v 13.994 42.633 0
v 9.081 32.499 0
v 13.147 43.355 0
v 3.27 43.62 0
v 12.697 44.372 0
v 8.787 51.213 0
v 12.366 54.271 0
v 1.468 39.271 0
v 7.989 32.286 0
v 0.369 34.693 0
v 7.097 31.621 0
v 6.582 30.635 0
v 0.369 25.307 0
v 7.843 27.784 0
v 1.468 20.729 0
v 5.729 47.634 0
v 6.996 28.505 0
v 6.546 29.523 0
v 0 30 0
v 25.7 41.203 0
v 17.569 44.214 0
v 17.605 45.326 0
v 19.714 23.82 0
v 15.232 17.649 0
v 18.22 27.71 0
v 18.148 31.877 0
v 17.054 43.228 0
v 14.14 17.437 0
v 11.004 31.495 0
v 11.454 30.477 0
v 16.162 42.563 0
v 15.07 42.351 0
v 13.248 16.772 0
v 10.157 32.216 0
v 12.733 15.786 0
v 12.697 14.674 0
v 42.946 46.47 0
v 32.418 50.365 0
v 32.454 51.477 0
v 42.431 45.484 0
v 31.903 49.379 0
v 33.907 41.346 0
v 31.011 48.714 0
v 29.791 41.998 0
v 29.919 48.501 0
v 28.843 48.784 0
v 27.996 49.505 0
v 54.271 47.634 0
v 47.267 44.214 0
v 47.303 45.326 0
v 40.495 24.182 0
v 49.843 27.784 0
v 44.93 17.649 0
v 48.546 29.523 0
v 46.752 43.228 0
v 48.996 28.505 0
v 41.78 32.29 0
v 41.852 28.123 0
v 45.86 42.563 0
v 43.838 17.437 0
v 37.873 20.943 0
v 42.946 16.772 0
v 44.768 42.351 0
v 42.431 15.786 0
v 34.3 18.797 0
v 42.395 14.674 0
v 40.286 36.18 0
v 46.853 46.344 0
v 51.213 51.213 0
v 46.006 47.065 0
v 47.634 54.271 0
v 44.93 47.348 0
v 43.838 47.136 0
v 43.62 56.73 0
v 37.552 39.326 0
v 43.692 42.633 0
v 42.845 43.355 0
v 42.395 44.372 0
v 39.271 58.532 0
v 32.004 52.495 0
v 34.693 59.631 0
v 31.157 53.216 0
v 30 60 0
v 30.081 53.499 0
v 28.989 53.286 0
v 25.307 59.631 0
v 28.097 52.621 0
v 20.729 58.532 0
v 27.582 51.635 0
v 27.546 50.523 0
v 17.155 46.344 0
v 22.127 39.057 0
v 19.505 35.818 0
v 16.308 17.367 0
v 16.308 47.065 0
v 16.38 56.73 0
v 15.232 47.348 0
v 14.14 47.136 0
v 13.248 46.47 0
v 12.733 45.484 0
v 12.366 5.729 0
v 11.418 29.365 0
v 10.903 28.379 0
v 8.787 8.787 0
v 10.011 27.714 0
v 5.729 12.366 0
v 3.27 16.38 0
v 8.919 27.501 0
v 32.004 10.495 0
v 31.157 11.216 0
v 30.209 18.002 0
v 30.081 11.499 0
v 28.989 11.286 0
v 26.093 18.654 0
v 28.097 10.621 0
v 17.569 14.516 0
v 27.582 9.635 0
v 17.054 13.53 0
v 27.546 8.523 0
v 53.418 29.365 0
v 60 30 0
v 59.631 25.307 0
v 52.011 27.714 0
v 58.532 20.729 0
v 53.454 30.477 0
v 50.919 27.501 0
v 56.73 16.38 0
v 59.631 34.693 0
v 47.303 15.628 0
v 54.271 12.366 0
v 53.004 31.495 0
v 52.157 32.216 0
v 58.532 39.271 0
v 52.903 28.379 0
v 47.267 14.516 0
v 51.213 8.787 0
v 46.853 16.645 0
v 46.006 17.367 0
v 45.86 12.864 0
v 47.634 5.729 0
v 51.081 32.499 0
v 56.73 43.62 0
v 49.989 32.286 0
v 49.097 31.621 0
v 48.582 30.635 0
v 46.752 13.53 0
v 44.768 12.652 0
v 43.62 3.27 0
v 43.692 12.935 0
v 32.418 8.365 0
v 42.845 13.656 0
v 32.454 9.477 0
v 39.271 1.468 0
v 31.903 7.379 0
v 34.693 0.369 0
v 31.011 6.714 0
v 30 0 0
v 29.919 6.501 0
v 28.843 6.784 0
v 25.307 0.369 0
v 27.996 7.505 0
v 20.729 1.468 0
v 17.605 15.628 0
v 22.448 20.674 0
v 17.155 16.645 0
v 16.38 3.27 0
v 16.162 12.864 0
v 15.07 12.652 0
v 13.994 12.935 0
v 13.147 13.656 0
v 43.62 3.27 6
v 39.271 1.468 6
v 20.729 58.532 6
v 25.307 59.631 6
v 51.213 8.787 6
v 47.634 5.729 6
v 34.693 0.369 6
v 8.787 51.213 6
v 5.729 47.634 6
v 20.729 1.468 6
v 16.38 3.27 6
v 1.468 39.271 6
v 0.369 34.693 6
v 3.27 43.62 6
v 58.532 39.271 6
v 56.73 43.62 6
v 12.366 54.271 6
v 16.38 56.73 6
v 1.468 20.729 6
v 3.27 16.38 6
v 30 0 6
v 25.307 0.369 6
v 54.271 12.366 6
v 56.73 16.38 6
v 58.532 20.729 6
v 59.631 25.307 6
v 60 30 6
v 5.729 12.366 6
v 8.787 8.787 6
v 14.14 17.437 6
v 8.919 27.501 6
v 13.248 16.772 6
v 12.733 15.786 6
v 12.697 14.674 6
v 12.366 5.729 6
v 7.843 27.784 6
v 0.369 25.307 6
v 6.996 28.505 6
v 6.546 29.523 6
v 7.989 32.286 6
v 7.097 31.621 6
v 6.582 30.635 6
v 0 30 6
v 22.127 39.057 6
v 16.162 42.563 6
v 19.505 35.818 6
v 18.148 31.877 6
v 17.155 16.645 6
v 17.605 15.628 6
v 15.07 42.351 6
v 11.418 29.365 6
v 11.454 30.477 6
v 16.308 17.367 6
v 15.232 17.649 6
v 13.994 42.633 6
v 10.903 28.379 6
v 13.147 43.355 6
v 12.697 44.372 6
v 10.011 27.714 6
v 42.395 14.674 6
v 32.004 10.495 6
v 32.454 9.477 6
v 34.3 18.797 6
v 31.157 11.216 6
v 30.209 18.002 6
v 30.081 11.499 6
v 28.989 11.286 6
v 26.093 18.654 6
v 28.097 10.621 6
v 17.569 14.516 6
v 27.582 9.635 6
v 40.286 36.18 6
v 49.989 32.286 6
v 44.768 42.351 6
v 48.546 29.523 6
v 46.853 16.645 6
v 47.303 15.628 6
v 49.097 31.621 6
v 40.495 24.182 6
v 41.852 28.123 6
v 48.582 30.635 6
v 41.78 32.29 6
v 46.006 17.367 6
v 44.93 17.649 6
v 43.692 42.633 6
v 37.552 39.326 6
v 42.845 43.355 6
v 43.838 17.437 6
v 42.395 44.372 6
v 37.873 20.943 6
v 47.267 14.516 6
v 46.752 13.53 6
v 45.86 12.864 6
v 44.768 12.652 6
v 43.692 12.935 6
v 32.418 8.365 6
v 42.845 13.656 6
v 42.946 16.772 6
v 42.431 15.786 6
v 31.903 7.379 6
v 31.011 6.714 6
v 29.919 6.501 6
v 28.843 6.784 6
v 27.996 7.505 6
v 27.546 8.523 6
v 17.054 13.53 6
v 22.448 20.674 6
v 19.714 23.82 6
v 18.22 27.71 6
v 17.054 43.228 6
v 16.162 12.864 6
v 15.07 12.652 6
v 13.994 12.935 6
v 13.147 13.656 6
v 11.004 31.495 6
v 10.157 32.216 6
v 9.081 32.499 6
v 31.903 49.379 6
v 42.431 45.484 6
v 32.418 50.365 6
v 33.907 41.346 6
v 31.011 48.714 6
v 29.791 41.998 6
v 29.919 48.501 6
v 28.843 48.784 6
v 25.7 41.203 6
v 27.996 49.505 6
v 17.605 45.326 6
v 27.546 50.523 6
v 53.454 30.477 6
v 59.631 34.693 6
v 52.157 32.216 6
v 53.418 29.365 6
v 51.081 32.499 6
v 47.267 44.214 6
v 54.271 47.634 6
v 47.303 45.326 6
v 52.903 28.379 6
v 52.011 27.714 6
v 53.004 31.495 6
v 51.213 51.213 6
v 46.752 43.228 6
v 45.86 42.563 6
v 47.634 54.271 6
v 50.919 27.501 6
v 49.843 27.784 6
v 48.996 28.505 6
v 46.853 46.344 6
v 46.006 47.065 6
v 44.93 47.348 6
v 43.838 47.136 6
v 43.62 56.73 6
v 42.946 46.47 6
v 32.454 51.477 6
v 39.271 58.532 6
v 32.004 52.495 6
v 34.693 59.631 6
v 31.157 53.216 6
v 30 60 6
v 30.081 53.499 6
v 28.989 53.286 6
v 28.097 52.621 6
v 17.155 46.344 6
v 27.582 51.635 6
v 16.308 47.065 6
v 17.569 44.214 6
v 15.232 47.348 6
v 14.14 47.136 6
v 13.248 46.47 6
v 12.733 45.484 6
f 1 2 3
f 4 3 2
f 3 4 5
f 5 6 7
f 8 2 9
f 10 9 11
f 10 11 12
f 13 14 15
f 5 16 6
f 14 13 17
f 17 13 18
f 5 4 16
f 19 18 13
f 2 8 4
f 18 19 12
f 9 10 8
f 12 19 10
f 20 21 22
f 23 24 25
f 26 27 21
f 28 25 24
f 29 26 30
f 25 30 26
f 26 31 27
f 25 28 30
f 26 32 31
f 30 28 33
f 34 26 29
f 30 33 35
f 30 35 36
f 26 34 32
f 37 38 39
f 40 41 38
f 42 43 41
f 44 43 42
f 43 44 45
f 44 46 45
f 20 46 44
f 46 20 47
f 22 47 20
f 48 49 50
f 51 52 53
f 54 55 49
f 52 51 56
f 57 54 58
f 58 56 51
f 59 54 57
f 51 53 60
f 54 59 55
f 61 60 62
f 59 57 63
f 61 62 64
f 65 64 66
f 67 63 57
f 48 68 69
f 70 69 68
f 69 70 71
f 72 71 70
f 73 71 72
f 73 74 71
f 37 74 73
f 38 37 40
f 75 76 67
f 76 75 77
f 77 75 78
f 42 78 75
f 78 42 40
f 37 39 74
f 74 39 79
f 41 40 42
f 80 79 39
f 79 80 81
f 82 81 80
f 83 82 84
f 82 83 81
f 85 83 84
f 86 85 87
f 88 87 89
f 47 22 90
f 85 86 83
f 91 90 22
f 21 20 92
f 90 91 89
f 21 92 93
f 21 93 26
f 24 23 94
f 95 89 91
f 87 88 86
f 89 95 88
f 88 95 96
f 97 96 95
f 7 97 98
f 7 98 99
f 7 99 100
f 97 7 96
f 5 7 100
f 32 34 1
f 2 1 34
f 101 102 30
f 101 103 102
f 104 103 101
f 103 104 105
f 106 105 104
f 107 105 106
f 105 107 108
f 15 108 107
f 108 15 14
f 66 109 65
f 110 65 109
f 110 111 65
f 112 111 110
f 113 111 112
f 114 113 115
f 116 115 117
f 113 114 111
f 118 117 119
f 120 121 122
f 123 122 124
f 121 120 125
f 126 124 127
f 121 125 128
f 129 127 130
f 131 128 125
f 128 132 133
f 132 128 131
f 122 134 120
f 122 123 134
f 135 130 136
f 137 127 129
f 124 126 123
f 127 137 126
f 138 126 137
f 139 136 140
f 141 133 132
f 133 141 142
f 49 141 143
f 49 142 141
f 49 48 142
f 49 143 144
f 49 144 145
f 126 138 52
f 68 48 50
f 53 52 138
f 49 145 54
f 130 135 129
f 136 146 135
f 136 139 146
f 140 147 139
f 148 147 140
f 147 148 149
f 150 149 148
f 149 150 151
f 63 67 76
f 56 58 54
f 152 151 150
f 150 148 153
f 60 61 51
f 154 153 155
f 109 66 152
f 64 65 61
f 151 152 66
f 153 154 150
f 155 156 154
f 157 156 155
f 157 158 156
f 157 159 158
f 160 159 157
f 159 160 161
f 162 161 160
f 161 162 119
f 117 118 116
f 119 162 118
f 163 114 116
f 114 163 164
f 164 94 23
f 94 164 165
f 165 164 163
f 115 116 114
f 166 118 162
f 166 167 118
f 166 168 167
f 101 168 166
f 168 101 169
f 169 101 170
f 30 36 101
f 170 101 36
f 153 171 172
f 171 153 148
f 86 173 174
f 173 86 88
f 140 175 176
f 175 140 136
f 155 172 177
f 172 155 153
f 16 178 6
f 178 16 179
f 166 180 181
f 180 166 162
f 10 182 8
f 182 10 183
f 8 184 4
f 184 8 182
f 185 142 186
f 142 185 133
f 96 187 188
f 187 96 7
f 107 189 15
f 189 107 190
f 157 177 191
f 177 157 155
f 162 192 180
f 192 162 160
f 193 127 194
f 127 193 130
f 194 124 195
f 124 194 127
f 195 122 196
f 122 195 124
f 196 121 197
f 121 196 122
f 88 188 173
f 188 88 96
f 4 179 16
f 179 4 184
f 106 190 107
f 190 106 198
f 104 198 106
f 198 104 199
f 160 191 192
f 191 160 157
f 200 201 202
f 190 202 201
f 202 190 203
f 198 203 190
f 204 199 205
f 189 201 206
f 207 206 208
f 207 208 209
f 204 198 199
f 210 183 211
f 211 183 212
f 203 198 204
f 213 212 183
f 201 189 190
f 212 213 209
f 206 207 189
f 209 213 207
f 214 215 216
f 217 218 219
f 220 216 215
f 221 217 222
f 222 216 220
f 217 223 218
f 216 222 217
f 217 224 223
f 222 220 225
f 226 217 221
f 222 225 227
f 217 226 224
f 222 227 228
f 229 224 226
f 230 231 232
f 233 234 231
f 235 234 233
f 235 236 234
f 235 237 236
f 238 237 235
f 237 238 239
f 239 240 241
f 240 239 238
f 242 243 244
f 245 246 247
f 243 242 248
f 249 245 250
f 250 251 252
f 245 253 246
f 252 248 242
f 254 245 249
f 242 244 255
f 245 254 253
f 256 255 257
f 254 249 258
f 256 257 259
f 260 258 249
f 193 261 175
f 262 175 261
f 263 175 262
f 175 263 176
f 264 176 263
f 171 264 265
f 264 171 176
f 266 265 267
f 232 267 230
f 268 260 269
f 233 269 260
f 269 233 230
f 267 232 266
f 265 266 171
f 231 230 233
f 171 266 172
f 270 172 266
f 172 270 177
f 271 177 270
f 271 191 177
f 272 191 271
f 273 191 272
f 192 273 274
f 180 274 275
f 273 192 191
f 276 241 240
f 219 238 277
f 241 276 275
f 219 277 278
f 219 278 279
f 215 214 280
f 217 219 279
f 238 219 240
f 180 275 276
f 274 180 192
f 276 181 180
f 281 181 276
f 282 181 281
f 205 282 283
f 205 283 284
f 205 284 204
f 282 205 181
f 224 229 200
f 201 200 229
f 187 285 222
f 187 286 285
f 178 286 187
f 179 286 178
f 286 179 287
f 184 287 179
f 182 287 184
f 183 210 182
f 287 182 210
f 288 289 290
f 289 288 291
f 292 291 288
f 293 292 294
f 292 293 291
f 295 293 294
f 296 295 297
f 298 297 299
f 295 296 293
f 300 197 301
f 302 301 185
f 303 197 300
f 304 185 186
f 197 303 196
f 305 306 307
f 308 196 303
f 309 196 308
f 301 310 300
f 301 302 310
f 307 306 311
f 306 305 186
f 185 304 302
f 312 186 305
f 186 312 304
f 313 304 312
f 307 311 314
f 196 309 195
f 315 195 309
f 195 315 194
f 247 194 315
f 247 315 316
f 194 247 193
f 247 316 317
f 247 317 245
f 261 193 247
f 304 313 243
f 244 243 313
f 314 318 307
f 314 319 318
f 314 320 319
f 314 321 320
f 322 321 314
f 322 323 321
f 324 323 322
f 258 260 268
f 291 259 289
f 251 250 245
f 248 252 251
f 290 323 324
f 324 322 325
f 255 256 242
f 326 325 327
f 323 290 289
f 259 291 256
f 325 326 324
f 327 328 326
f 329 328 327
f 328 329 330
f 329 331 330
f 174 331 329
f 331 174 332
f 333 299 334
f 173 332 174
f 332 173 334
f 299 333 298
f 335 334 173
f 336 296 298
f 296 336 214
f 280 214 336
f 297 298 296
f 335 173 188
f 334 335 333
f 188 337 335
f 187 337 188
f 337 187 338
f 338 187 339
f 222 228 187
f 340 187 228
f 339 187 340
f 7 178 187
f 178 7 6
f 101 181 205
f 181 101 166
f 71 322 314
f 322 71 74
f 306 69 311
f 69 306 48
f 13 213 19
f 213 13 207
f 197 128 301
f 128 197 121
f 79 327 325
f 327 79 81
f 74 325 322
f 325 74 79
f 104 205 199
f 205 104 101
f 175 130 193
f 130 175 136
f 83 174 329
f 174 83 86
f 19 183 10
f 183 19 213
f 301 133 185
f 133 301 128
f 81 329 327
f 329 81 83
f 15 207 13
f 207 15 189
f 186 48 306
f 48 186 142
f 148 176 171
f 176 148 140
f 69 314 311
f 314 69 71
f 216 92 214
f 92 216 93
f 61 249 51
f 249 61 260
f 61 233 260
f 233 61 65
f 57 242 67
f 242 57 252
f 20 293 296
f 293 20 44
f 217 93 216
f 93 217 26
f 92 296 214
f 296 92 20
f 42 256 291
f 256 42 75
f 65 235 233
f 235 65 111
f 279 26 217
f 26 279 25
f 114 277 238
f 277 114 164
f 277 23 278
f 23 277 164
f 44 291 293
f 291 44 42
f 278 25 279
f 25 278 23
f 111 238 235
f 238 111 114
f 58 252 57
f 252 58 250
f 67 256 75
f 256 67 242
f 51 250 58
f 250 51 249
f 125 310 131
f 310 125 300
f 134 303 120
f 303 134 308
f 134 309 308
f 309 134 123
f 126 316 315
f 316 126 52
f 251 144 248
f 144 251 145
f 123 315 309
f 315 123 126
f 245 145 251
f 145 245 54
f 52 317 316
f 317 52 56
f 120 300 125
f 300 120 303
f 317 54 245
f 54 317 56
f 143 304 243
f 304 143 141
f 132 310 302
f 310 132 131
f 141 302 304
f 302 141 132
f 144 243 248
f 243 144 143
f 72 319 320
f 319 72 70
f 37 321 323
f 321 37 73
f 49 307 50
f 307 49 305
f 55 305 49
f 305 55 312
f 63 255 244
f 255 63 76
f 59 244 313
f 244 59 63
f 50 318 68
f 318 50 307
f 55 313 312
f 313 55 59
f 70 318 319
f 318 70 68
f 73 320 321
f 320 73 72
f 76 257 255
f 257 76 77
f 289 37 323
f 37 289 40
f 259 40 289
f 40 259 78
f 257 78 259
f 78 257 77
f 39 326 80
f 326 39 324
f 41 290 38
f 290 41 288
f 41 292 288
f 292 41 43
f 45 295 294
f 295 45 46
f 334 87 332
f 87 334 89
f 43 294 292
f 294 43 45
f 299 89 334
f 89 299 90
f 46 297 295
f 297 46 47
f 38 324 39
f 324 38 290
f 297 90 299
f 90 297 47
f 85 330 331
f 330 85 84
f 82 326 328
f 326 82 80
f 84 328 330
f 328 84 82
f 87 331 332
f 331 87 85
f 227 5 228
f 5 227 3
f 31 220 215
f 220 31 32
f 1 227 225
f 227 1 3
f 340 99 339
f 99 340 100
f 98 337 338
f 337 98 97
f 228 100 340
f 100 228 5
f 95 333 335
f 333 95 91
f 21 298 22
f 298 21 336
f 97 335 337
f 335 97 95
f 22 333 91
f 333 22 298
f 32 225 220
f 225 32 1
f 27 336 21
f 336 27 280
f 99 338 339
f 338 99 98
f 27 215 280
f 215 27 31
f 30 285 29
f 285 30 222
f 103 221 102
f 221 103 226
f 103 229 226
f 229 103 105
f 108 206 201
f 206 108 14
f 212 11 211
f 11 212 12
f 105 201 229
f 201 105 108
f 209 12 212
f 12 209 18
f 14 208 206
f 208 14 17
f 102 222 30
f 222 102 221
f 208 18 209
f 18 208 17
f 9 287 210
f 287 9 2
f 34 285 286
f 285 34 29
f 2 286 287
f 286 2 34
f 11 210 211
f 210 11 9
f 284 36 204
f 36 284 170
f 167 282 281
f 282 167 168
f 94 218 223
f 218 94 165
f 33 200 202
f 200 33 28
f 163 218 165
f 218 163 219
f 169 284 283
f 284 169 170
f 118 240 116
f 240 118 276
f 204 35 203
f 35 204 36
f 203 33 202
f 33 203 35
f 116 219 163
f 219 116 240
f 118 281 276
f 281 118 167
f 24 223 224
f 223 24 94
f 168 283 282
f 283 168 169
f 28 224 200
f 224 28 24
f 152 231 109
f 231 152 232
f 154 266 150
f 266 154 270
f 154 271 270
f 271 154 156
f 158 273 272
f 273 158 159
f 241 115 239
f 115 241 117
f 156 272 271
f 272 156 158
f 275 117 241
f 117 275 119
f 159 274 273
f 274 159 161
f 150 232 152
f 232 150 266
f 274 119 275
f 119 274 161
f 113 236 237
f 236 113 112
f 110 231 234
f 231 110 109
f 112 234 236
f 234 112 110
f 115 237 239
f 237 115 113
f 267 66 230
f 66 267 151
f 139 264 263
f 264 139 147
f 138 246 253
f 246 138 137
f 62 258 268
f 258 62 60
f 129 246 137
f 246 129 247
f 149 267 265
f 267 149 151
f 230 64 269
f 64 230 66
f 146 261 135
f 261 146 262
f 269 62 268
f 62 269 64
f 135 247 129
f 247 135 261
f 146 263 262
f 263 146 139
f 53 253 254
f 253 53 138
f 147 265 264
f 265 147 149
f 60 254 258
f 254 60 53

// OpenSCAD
$fn = 32;

// ----------------------------------------------------------------------
// Spacer plate: round flange R30, 8 bolts
// ----------------------------------------------------------------------

// --- parameters (mm) ---
bore_r = 12;              // centre bore radius
bolt_r = 2.5;             // bolt hole radius
plate_t = 6;              // plate thickness, Z (extrusion height)
flange_r = 30;            // flange radius
n_bolt = 8;               // bolt hole count
ring_r = 21;              // bolt circle radius

profile = [[60, 30], [59.631, 34.693], [58.532, 39.271], [56.73, 43.62], [54.271, 47.634], [51.213, 51.213], [47.634, 54.271], [43.62, 56.73], [39.271, 58.532], [34.693, 59.631], [30, 60], [25.307, 59.631], [20.729, 58.532], [16.38, 56.73], [12.366, 54.271], [8.787, 51.213], [5.729, 47.634], [3.27, 43.62], [1.468, 39.271], [0.369, 34.693], [0, 30], [0.369, 25.307], [1.468, 20.729], [3.27, 16.38], [5.729, 12.366], [8.787, 8.787], [12.366, 5.729], [16.38, 3.27], [20.729, 1.468], [25.307, 0.369], [30, 0], [34.693, 0.369], [39.271, 1.468], [43.62, 3.27], [47.634, 5.729], [51.213, 8.787], [54.271, 12.366], [56.73, 16.38], [58.532, 20.729], [59.631, 25.307]];  // primary outline, 40 points, counter clockwise
void_1 = [[41.78, 32.29], [40.286, 36.18], [37.552, 39.326], [33.907, 41.346], [29.791, 41.998], [25.7, 41.203], [22.127, 39.057], [19.505, 35.818], [18.148, 31.877], [18.22, 27.71], [19.714, 23.82], [22.448, 20.674], [26.093, 18.654], [30.209, 18.002], [34.3, 18.797], [37.873, 20.943], [40.495, 24.182], [41.852, 28.123]];  // centre bore, 18 points
void_2 = [[53.454, 30.477], [53.004, 31.495], [52.157, 32.216], [51.081, 32.499], [49.989, 32.286], [49.097, 31.621], [48.582, 30.635], [48.546, 29.523], [48.996, 28.505], [49.843, 27.784], [50.919, 27.501], [52.011, 27.714], [52.903, 28.379], [53.418, 29.365]];  // bolt hole 1, 14 points
void_3 = [[47.303, 45.326], [46.853, 46.344], [46.006, 47.065], [44.93, 47.348], [43.838, 47.136], [42.946, 46.47], [42.431, 45.484], [42.395, 44.372], [42.845, 43.355], [43.692, 42.633], [44.768, 42.351], [45.86, 42.563], [46.752, 43.228], [47.267, 44.214]];  // bolt hole 2, 14 points
void_4 = [[32.454, 51.477], [32.004, 52.495], [31.157, 53.216], [30.081, 53.499], [28.989, 53.286], [28.097, 52.621], [27.582, 51.635], [27.546, 50.523], [27.996, 49.505], [28.843, 48.784], [29.919, 48.501], [31.011, 48.714], [31.903, 49.379], [32.418, 50.365]];  // bolt hole 3, 14 points
void_5 = [[17.605, 45.326], [17.155, 46.344], [16.308, 47.065], [15.232, 47.348], [14.14, 47.136], [13.248, 46.47], [12.733, 45.484], [12.697, 44.372], [13.147, 43.355], [13.994, 42.633], [15.07, 42.351], [16.162, 42.563], [17.054, 43.228], [17.569, 44.214]];  // bolt hole 4, 14 points
void_6 = [[11.454, 30.477], [11.004, 31.495], [10.157, 32.216], [9.081, 32.499], [7.989, 32.286], [7.097, 31.621], [6.582, 30.635], [6.546, 29.523], [6.996, 28.505], [7.843, 27.784], [8.919, 27.501], [10.011, 27.714], [10.903, 28.379], [11.418, 29.365]];  // bolt hole 5, 14 points
void_7 = [[17.605, 15.628], [17.155, 16.645], [16.308, 17.367], [15.232, 17.649], [14.14, 17.437], [13.248, 16.772], [12.733, 15.786], [12.697, 14.674], [13.147, 13.656], [13.994, 12.935], [15.07, 12.652], [16.162, 12.864], [17.054, 13.53], [17.569, 14.516]];  // bolt hole 6, 14 points
void_8 = [[32.454, 9.477], [32.004, 10.495], [31.157, 11.216], [30.081, 11.499], [28.989, 11.286], [28.097, 10.621], [27.582, 9.635], [27.546, 8.523], [27.996, 7.505], [28.843, 6.784], [29.919, 6.501], [31.011, 6.714], [31.903, 7.379], [32.418, 8.365]];  // bolt hole 7, 14 points
void_9 = [[47.303, 15.628], [46.853, 16.645], [46.006, 17.367], [44.93, 17.649], [43.838, 17.437], [42.946, 16.772], [42.431, 15.786], [42.395, 14.674], [42.845, 13.656], [43.692, 12.935], [44.768, 12.652], [45.86, 12.864], [46.752, 13.53], [47.267, 14.516]];  // bolt hole 8, 14 points

// --- the one profile operation ---
difference() {
  linear_extrude(height = plate_t) polygon(points = profile);
  translate([0, 0, -1])
    linear_extrude(height = plate_t + 2) polygon(points = void_1);
  translate([0, 0, -1])
    linear_extrude(height = plate_t + 2) polygon(points = void_2);
  translate([0, 0, -1])
    linear_extrude(height = plate_t + 2) polygon(points = void_3);
  translate([0, 0, -1])
    linear_extrude(height = plate_t + 2) polygon(points = void_4);
  translate([0, 0, -1])
    linear_extrude(height = plate_t + 2) polygon(points = void_5);
  translate([0, 0, -1])
    linear_extrude(height = plate_t + 2) polygon(points = void_6);
  translate([0, 0, -1])
    linear_extrude(height = plate_t + 2) polygon(points = void_7);
  translate([0, 0, -1])
    linear_extrude(height = plate_t + 2) polygon(points = void_8);
  translate([0, 0, -1])
    linear_extrude(height = plate_t + 2) polygon(points = void_9);
}
